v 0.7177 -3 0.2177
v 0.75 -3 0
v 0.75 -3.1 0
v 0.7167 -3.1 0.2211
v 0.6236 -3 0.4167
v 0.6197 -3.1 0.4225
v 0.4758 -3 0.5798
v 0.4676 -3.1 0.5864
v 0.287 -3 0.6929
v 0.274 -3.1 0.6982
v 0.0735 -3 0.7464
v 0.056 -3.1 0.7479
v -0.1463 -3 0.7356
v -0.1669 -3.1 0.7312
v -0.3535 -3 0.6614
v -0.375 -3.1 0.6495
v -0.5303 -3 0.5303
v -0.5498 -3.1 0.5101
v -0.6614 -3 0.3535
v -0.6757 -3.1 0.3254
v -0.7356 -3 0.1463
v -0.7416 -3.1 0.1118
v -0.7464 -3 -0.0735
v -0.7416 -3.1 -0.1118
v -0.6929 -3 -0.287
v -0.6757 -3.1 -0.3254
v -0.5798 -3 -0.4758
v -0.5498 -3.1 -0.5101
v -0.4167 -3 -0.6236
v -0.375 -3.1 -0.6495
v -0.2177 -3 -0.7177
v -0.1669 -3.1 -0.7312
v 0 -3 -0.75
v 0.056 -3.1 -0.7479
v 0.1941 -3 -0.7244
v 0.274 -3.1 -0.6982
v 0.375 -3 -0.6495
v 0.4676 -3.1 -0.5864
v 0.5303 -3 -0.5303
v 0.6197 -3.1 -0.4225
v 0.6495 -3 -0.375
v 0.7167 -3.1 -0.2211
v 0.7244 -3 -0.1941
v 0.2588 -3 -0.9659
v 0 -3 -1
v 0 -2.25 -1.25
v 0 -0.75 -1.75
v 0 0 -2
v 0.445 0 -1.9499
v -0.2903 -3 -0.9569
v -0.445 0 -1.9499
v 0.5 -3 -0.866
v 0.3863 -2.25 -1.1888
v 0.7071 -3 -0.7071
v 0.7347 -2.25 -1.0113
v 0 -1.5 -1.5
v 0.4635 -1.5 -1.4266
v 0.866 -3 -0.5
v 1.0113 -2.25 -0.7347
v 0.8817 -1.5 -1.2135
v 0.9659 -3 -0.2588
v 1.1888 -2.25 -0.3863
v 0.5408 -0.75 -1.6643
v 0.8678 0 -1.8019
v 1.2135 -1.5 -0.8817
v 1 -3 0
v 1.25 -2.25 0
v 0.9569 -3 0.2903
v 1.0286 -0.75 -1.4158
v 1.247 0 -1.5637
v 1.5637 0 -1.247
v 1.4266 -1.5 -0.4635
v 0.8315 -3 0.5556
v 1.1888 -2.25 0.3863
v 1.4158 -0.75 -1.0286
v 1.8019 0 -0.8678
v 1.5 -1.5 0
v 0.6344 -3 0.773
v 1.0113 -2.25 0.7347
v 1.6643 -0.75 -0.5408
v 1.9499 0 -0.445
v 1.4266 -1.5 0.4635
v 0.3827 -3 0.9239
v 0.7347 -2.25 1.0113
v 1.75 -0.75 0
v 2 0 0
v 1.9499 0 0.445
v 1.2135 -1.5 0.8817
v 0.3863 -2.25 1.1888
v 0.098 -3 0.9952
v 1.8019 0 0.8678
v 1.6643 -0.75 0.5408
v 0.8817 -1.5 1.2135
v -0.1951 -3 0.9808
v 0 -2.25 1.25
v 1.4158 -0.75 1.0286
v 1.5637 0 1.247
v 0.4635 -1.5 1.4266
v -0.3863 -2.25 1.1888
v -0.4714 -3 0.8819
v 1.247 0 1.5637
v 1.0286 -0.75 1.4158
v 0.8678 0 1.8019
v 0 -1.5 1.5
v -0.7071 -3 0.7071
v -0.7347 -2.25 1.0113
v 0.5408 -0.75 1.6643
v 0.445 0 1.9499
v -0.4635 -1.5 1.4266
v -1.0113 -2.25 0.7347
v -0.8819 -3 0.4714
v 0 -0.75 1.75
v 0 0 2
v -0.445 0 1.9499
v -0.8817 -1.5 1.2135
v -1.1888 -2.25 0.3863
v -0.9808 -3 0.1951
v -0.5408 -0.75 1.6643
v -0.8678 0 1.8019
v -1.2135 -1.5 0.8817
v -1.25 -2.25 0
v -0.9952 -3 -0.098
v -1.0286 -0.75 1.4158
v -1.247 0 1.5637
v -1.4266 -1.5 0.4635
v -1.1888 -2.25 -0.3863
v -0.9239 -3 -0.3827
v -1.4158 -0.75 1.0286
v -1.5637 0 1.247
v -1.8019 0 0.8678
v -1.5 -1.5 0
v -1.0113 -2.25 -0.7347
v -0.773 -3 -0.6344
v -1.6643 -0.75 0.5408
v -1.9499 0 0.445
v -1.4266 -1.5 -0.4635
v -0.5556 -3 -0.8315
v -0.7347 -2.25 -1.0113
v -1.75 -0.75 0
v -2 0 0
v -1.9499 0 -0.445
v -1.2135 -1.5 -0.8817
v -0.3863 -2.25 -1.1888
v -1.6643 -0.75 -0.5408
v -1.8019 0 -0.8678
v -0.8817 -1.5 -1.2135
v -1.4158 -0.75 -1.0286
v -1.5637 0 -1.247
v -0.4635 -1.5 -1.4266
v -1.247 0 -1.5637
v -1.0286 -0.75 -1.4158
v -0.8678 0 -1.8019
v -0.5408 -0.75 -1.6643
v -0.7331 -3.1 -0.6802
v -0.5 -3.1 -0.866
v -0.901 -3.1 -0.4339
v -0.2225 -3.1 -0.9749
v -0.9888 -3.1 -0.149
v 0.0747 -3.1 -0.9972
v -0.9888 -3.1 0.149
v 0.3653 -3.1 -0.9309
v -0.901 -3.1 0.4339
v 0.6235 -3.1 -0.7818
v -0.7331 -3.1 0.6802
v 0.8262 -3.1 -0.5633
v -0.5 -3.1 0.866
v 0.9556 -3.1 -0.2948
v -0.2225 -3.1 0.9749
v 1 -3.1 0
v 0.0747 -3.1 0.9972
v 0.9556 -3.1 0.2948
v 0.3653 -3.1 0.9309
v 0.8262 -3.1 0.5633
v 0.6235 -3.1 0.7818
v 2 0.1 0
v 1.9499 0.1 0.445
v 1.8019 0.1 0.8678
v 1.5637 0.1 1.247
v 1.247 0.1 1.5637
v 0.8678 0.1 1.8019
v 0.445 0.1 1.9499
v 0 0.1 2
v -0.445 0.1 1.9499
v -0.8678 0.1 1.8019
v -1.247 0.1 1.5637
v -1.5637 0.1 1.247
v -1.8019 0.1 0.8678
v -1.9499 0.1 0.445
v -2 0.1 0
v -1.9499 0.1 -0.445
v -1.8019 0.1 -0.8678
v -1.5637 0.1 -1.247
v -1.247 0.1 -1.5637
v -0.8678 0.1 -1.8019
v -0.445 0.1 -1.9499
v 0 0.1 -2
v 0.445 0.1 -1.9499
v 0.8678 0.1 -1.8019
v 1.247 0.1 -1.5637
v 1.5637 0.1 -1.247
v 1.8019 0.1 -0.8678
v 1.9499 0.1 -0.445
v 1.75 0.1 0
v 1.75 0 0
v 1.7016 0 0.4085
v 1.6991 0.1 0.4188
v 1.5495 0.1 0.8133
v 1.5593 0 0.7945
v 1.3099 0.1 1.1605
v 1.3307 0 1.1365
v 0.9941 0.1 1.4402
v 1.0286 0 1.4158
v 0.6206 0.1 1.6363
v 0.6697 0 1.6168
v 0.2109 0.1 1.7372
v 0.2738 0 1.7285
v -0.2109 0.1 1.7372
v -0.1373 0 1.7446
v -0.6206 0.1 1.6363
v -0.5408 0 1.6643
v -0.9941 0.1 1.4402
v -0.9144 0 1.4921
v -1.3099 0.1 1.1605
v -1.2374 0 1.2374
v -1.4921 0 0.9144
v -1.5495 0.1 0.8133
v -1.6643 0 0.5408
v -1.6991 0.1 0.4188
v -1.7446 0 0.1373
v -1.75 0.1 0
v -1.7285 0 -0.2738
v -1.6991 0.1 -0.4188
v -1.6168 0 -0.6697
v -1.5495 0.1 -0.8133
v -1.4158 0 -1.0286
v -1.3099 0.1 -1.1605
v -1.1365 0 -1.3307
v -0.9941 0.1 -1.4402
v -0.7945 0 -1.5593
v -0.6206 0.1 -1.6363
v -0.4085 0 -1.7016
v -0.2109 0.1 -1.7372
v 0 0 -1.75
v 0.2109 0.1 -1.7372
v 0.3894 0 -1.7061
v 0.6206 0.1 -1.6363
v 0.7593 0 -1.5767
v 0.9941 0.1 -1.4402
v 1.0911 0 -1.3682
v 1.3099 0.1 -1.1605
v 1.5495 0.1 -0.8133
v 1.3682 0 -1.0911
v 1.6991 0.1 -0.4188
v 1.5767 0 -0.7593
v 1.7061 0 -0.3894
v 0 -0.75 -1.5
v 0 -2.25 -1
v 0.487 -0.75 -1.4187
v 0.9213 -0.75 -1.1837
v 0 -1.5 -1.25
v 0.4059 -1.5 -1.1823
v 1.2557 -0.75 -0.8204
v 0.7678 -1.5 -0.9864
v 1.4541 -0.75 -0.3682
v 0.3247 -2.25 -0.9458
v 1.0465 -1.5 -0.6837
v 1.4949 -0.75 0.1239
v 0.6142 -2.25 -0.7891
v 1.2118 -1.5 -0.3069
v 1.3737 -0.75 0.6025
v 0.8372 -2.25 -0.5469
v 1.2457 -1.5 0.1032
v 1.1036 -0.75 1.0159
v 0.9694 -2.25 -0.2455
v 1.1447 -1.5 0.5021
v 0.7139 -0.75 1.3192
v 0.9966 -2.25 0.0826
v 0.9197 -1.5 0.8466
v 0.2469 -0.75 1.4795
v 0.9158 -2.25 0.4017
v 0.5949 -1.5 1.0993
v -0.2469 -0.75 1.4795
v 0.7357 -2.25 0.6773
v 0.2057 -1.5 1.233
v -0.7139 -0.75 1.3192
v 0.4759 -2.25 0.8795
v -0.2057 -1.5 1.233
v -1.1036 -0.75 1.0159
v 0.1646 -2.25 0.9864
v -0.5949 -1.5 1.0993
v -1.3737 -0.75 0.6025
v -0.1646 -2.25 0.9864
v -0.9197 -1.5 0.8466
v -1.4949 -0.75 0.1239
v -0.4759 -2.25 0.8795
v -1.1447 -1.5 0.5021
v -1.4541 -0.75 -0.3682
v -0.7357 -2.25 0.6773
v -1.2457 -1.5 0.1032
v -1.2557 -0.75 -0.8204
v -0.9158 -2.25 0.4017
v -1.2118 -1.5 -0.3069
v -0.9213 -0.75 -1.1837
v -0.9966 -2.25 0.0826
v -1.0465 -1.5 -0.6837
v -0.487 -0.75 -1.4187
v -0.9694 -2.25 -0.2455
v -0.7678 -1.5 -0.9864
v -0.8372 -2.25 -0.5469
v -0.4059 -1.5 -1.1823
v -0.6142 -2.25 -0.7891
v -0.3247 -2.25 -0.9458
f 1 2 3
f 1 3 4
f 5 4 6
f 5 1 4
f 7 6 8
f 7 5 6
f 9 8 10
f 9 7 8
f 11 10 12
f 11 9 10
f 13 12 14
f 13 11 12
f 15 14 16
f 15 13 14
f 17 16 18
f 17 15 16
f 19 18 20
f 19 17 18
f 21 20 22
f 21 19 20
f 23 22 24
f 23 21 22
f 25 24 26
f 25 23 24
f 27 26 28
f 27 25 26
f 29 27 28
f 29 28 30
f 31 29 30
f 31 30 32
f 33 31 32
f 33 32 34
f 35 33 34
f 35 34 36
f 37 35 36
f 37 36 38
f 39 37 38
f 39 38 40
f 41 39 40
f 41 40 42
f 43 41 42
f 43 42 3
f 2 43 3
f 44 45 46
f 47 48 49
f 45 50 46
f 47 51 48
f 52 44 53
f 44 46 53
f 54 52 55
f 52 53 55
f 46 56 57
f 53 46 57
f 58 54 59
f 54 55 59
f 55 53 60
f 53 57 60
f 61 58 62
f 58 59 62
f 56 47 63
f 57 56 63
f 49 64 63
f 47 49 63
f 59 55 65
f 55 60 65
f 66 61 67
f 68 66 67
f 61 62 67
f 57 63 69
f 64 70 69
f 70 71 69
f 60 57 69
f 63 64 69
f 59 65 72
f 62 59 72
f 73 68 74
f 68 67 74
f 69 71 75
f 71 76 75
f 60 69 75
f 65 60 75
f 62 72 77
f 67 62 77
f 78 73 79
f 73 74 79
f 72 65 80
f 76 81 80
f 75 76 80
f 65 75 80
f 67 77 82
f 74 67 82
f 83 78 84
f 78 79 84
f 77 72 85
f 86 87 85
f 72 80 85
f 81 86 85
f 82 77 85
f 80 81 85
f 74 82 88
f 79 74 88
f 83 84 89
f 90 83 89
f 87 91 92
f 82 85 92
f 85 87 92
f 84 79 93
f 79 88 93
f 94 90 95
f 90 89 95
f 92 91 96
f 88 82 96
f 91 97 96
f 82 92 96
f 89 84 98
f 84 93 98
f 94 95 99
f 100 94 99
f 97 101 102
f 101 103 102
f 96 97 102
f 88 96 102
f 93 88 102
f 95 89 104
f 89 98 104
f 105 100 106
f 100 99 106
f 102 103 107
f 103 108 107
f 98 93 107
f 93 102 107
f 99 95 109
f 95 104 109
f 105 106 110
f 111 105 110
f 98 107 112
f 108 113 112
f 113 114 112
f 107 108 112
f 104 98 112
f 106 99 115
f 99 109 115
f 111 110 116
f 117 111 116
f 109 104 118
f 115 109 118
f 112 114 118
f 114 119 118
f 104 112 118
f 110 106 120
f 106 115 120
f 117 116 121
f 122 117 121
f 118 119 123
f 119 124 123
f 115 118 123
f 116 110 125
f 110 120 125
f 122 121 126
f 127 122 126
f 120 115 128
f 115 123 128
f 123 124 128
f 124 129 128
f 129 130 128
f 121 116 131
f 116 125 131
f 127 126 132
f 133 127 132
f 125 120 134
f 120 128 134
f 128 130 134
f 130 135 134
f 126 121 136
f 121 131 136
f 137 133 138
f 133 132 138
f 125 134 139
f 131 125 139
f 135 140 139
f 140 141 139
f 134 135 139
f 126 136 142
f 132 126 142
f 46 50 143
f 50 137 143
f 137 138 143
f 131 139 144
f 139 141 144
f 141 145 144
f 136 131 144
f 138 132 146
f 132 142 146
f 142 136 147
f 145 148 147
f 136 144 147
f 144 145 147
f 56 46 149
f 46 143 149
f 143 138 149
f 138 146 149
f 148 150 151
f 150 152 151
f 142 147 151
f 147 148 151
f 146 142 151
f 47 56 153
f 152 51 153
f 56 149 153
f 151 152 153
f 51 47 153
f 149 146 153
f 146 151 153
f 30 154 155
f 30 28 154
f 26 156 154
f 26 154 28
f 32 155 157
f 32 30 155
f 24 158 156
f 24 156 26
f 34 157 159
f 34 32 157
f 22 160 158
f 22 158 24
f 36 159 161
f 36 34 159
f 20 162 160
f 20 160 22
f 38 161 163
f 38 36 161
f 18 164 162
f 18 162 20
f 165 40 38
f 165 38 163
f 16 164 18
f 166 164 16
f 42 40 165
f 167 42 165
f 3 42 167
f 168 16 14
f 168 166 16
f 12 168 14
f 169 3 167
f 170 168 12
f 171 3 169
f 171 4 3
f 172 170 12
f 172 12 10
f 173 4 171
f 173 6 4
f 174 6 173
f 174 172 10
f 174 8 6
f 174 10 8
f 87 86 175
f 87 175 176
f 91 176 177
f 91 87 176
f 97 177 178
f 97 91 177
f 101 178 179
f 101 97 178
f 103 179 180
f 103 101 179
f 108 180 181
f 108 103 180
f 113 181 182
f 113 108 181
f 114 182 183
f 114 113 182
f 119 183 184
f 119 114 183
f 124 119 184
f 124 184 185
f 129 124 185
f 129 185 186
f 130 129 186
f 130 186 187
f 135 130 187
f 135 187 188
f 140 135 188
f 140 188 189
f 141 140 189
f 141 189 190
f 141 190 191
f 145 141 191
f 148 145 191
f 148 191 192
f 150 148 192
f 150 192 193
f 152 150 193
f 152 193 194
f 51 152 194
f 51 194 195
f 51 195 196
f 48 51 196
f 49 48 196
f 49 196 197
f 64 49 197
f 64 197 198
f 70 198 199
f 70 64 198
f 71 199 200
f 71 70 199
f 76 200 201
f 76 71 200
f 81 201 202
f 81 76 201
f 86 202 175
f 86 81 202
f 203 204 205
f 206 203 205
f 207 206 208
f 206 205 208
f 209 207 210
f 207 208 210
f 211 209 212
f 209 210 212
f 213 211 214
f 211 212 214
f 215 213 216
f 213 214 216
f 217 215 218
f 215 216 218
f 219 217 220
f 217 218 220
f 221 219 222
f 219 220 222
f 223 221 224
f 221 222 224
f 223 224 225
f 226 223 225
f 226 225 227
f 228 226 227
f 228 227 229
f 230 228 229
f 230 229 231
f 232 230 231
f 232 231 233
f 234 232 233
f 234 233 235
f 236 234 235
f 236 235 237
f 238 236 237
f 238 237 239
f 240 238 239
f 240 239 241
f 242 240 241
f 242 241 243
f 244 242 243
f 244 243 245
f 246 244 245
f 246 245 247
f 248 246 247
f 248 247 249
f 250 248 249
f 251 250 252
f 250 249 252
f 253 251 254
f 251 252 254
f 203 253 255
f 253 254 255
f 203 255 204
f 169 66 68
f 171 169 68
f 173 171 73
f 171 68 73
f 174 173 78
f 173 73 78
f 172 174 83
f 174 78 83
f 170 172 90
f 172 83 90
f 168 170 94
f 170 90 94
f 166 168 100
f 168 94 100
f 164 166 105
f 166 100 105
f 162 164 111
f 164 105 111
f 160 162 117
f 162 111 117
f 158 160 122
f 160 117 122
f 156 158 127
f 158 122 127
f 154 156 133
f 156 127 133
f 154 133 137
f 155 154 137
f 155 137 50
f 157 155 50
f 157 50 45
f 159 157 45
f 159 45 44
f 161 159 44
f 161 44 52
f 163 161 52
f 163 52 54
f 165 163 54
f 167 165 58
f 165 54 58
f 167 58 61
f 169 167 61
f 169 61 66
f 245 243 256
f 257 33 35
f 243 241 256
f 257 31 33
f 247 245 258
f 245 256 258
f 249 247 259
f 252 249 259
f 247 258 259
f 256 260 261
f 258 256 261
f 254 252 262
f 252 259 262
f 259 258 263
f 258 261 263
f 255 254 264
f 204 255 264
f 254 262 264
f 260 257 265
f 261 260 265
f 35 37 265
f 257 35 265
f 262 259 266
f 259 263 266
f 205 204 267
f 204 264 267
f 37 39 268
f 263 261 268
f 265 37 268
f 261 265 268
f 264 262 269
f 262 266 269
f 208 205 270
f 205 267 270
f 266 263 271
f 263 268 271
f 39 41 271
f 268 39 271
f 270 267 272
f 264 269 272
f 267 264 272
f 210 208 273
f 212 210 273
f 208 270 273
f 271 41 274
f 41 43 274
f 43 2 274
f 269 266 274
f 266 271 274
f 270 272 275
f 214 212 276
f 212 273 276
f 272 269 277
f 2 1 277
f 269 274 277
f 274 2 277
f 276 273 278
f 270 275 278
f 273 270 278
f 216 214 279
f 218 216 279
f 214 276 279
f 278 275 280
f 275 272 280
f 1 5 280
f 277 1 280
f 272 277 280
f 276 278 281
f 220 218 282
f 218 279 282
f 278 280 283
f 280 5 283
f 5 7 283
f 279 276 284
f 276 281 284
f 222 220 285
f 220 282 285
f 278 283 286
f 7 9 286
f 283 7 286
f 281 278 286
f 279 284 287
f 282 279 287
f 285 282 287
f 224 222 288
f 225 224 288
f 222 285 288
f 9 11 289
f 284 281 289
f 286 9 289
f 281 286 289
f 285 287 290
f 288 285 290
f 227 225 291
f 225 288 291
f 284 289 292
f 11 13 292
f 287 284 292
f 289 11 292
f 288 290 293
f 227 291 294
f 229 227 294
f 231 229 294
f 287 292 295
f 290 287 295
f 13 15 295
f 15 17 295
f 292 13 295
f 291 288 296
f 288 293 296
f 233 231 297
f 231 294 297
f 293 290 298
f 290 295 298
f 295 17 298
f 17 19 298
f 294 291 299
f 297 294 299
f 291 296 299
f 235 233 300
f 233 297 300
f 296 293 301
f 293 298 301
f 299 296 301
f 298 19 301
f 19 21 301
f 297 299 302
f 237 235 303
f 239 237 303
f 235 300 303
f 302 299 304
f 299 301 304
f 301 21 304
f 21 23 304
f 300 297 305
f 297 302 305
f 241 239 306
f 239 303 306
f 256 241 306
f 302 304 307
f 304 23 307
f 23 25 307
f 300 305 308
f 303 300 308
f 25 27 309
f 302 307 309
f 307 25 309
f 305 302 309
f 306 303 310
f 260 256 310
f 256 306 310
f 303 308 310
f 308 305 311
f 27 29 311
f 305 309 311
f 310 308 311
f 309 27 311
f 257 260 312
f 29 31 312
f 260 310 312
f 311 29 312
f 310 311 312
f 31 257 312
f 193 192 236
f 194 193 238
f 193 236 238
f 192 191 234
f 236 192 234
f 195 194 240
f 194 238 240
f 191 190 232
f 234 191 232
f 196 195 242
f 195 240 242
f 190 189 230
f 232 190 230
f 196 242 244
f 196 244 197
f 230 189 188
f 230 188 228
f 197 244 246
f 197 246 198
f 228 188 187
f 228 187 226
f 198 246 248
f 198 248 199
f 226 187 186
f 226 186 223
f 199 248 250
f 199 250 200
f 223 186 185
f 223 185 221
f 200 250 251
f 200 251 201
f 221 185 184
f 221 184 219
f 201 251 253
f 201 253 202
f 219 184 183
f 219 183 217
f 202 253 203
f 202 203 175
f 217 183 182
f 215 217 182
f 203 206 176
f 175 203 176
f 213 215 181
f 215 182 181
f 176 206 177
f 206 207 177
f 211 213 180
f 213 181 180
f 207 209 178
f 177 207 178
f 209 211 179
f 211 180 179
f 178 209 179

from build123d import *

# Parameters (mm, degrees)
F2_R     = 1
F2_R_2   = 0.75
F3_DEPTH = 2
F1_R     = 2
F1_R_2   = 1.75
F4_DEPTH = 2
F7_DEPTH = 1.9
F8_DEPTH = 1.9


with BuildPart() as f3:
    # F2 (on offset) → F3 (new body)
    with BuildSketch(Plane.XZ.offset(3)):
        Circle(F2_R)
        Circle(F2_R_2, mode=Mode.SUBTRACT)
    extrude(amount=F3_DEPTH)



with BuildPart() as f4:
    # F1 (on Front) → F4 (new body)
    with BuildSketch(Plane.XZ):
        Circle(F1_R)
        Circle(F1_R_2, mode=Mode.SUBTRACT)
    extrude(amount=-F4_DEPTH)


with BuildPart() as f3_1:
    add(f3.part)

    add(f4.part)  # F6 merges F4
    # F5 (on Right) → F6 (revolve)
    with BuildSketch(Plane.YZ):
        Polygon((-3, -1), (0, -2), (0, -1.75), (-3, -0.75), align=None)
    revolve(axis=Axis((0, -1.5, 0), (0, -1, 0)))

    # F7 (cut): a face of the model
    f7_faces = [f3_1.faces().sort_by_distance(p)[0] for p in [
        (-0.9717157288, -5, 0),
    ]]
    extrude(f7_faces, amount=-F7_DEPTH, mode=Mode.SUBTRACT)

    # F8 (cut): a face of the model
    f8_faces = [f3_1.faces().sort_by_distance(p)[0] for p in [
        (-1.9434314575, 2, 0),
    ]]
    extrude(f8_faces, amount=-F8_DEPTH, mode=Mode.SUBTRACT)


solid = f3_1.part
